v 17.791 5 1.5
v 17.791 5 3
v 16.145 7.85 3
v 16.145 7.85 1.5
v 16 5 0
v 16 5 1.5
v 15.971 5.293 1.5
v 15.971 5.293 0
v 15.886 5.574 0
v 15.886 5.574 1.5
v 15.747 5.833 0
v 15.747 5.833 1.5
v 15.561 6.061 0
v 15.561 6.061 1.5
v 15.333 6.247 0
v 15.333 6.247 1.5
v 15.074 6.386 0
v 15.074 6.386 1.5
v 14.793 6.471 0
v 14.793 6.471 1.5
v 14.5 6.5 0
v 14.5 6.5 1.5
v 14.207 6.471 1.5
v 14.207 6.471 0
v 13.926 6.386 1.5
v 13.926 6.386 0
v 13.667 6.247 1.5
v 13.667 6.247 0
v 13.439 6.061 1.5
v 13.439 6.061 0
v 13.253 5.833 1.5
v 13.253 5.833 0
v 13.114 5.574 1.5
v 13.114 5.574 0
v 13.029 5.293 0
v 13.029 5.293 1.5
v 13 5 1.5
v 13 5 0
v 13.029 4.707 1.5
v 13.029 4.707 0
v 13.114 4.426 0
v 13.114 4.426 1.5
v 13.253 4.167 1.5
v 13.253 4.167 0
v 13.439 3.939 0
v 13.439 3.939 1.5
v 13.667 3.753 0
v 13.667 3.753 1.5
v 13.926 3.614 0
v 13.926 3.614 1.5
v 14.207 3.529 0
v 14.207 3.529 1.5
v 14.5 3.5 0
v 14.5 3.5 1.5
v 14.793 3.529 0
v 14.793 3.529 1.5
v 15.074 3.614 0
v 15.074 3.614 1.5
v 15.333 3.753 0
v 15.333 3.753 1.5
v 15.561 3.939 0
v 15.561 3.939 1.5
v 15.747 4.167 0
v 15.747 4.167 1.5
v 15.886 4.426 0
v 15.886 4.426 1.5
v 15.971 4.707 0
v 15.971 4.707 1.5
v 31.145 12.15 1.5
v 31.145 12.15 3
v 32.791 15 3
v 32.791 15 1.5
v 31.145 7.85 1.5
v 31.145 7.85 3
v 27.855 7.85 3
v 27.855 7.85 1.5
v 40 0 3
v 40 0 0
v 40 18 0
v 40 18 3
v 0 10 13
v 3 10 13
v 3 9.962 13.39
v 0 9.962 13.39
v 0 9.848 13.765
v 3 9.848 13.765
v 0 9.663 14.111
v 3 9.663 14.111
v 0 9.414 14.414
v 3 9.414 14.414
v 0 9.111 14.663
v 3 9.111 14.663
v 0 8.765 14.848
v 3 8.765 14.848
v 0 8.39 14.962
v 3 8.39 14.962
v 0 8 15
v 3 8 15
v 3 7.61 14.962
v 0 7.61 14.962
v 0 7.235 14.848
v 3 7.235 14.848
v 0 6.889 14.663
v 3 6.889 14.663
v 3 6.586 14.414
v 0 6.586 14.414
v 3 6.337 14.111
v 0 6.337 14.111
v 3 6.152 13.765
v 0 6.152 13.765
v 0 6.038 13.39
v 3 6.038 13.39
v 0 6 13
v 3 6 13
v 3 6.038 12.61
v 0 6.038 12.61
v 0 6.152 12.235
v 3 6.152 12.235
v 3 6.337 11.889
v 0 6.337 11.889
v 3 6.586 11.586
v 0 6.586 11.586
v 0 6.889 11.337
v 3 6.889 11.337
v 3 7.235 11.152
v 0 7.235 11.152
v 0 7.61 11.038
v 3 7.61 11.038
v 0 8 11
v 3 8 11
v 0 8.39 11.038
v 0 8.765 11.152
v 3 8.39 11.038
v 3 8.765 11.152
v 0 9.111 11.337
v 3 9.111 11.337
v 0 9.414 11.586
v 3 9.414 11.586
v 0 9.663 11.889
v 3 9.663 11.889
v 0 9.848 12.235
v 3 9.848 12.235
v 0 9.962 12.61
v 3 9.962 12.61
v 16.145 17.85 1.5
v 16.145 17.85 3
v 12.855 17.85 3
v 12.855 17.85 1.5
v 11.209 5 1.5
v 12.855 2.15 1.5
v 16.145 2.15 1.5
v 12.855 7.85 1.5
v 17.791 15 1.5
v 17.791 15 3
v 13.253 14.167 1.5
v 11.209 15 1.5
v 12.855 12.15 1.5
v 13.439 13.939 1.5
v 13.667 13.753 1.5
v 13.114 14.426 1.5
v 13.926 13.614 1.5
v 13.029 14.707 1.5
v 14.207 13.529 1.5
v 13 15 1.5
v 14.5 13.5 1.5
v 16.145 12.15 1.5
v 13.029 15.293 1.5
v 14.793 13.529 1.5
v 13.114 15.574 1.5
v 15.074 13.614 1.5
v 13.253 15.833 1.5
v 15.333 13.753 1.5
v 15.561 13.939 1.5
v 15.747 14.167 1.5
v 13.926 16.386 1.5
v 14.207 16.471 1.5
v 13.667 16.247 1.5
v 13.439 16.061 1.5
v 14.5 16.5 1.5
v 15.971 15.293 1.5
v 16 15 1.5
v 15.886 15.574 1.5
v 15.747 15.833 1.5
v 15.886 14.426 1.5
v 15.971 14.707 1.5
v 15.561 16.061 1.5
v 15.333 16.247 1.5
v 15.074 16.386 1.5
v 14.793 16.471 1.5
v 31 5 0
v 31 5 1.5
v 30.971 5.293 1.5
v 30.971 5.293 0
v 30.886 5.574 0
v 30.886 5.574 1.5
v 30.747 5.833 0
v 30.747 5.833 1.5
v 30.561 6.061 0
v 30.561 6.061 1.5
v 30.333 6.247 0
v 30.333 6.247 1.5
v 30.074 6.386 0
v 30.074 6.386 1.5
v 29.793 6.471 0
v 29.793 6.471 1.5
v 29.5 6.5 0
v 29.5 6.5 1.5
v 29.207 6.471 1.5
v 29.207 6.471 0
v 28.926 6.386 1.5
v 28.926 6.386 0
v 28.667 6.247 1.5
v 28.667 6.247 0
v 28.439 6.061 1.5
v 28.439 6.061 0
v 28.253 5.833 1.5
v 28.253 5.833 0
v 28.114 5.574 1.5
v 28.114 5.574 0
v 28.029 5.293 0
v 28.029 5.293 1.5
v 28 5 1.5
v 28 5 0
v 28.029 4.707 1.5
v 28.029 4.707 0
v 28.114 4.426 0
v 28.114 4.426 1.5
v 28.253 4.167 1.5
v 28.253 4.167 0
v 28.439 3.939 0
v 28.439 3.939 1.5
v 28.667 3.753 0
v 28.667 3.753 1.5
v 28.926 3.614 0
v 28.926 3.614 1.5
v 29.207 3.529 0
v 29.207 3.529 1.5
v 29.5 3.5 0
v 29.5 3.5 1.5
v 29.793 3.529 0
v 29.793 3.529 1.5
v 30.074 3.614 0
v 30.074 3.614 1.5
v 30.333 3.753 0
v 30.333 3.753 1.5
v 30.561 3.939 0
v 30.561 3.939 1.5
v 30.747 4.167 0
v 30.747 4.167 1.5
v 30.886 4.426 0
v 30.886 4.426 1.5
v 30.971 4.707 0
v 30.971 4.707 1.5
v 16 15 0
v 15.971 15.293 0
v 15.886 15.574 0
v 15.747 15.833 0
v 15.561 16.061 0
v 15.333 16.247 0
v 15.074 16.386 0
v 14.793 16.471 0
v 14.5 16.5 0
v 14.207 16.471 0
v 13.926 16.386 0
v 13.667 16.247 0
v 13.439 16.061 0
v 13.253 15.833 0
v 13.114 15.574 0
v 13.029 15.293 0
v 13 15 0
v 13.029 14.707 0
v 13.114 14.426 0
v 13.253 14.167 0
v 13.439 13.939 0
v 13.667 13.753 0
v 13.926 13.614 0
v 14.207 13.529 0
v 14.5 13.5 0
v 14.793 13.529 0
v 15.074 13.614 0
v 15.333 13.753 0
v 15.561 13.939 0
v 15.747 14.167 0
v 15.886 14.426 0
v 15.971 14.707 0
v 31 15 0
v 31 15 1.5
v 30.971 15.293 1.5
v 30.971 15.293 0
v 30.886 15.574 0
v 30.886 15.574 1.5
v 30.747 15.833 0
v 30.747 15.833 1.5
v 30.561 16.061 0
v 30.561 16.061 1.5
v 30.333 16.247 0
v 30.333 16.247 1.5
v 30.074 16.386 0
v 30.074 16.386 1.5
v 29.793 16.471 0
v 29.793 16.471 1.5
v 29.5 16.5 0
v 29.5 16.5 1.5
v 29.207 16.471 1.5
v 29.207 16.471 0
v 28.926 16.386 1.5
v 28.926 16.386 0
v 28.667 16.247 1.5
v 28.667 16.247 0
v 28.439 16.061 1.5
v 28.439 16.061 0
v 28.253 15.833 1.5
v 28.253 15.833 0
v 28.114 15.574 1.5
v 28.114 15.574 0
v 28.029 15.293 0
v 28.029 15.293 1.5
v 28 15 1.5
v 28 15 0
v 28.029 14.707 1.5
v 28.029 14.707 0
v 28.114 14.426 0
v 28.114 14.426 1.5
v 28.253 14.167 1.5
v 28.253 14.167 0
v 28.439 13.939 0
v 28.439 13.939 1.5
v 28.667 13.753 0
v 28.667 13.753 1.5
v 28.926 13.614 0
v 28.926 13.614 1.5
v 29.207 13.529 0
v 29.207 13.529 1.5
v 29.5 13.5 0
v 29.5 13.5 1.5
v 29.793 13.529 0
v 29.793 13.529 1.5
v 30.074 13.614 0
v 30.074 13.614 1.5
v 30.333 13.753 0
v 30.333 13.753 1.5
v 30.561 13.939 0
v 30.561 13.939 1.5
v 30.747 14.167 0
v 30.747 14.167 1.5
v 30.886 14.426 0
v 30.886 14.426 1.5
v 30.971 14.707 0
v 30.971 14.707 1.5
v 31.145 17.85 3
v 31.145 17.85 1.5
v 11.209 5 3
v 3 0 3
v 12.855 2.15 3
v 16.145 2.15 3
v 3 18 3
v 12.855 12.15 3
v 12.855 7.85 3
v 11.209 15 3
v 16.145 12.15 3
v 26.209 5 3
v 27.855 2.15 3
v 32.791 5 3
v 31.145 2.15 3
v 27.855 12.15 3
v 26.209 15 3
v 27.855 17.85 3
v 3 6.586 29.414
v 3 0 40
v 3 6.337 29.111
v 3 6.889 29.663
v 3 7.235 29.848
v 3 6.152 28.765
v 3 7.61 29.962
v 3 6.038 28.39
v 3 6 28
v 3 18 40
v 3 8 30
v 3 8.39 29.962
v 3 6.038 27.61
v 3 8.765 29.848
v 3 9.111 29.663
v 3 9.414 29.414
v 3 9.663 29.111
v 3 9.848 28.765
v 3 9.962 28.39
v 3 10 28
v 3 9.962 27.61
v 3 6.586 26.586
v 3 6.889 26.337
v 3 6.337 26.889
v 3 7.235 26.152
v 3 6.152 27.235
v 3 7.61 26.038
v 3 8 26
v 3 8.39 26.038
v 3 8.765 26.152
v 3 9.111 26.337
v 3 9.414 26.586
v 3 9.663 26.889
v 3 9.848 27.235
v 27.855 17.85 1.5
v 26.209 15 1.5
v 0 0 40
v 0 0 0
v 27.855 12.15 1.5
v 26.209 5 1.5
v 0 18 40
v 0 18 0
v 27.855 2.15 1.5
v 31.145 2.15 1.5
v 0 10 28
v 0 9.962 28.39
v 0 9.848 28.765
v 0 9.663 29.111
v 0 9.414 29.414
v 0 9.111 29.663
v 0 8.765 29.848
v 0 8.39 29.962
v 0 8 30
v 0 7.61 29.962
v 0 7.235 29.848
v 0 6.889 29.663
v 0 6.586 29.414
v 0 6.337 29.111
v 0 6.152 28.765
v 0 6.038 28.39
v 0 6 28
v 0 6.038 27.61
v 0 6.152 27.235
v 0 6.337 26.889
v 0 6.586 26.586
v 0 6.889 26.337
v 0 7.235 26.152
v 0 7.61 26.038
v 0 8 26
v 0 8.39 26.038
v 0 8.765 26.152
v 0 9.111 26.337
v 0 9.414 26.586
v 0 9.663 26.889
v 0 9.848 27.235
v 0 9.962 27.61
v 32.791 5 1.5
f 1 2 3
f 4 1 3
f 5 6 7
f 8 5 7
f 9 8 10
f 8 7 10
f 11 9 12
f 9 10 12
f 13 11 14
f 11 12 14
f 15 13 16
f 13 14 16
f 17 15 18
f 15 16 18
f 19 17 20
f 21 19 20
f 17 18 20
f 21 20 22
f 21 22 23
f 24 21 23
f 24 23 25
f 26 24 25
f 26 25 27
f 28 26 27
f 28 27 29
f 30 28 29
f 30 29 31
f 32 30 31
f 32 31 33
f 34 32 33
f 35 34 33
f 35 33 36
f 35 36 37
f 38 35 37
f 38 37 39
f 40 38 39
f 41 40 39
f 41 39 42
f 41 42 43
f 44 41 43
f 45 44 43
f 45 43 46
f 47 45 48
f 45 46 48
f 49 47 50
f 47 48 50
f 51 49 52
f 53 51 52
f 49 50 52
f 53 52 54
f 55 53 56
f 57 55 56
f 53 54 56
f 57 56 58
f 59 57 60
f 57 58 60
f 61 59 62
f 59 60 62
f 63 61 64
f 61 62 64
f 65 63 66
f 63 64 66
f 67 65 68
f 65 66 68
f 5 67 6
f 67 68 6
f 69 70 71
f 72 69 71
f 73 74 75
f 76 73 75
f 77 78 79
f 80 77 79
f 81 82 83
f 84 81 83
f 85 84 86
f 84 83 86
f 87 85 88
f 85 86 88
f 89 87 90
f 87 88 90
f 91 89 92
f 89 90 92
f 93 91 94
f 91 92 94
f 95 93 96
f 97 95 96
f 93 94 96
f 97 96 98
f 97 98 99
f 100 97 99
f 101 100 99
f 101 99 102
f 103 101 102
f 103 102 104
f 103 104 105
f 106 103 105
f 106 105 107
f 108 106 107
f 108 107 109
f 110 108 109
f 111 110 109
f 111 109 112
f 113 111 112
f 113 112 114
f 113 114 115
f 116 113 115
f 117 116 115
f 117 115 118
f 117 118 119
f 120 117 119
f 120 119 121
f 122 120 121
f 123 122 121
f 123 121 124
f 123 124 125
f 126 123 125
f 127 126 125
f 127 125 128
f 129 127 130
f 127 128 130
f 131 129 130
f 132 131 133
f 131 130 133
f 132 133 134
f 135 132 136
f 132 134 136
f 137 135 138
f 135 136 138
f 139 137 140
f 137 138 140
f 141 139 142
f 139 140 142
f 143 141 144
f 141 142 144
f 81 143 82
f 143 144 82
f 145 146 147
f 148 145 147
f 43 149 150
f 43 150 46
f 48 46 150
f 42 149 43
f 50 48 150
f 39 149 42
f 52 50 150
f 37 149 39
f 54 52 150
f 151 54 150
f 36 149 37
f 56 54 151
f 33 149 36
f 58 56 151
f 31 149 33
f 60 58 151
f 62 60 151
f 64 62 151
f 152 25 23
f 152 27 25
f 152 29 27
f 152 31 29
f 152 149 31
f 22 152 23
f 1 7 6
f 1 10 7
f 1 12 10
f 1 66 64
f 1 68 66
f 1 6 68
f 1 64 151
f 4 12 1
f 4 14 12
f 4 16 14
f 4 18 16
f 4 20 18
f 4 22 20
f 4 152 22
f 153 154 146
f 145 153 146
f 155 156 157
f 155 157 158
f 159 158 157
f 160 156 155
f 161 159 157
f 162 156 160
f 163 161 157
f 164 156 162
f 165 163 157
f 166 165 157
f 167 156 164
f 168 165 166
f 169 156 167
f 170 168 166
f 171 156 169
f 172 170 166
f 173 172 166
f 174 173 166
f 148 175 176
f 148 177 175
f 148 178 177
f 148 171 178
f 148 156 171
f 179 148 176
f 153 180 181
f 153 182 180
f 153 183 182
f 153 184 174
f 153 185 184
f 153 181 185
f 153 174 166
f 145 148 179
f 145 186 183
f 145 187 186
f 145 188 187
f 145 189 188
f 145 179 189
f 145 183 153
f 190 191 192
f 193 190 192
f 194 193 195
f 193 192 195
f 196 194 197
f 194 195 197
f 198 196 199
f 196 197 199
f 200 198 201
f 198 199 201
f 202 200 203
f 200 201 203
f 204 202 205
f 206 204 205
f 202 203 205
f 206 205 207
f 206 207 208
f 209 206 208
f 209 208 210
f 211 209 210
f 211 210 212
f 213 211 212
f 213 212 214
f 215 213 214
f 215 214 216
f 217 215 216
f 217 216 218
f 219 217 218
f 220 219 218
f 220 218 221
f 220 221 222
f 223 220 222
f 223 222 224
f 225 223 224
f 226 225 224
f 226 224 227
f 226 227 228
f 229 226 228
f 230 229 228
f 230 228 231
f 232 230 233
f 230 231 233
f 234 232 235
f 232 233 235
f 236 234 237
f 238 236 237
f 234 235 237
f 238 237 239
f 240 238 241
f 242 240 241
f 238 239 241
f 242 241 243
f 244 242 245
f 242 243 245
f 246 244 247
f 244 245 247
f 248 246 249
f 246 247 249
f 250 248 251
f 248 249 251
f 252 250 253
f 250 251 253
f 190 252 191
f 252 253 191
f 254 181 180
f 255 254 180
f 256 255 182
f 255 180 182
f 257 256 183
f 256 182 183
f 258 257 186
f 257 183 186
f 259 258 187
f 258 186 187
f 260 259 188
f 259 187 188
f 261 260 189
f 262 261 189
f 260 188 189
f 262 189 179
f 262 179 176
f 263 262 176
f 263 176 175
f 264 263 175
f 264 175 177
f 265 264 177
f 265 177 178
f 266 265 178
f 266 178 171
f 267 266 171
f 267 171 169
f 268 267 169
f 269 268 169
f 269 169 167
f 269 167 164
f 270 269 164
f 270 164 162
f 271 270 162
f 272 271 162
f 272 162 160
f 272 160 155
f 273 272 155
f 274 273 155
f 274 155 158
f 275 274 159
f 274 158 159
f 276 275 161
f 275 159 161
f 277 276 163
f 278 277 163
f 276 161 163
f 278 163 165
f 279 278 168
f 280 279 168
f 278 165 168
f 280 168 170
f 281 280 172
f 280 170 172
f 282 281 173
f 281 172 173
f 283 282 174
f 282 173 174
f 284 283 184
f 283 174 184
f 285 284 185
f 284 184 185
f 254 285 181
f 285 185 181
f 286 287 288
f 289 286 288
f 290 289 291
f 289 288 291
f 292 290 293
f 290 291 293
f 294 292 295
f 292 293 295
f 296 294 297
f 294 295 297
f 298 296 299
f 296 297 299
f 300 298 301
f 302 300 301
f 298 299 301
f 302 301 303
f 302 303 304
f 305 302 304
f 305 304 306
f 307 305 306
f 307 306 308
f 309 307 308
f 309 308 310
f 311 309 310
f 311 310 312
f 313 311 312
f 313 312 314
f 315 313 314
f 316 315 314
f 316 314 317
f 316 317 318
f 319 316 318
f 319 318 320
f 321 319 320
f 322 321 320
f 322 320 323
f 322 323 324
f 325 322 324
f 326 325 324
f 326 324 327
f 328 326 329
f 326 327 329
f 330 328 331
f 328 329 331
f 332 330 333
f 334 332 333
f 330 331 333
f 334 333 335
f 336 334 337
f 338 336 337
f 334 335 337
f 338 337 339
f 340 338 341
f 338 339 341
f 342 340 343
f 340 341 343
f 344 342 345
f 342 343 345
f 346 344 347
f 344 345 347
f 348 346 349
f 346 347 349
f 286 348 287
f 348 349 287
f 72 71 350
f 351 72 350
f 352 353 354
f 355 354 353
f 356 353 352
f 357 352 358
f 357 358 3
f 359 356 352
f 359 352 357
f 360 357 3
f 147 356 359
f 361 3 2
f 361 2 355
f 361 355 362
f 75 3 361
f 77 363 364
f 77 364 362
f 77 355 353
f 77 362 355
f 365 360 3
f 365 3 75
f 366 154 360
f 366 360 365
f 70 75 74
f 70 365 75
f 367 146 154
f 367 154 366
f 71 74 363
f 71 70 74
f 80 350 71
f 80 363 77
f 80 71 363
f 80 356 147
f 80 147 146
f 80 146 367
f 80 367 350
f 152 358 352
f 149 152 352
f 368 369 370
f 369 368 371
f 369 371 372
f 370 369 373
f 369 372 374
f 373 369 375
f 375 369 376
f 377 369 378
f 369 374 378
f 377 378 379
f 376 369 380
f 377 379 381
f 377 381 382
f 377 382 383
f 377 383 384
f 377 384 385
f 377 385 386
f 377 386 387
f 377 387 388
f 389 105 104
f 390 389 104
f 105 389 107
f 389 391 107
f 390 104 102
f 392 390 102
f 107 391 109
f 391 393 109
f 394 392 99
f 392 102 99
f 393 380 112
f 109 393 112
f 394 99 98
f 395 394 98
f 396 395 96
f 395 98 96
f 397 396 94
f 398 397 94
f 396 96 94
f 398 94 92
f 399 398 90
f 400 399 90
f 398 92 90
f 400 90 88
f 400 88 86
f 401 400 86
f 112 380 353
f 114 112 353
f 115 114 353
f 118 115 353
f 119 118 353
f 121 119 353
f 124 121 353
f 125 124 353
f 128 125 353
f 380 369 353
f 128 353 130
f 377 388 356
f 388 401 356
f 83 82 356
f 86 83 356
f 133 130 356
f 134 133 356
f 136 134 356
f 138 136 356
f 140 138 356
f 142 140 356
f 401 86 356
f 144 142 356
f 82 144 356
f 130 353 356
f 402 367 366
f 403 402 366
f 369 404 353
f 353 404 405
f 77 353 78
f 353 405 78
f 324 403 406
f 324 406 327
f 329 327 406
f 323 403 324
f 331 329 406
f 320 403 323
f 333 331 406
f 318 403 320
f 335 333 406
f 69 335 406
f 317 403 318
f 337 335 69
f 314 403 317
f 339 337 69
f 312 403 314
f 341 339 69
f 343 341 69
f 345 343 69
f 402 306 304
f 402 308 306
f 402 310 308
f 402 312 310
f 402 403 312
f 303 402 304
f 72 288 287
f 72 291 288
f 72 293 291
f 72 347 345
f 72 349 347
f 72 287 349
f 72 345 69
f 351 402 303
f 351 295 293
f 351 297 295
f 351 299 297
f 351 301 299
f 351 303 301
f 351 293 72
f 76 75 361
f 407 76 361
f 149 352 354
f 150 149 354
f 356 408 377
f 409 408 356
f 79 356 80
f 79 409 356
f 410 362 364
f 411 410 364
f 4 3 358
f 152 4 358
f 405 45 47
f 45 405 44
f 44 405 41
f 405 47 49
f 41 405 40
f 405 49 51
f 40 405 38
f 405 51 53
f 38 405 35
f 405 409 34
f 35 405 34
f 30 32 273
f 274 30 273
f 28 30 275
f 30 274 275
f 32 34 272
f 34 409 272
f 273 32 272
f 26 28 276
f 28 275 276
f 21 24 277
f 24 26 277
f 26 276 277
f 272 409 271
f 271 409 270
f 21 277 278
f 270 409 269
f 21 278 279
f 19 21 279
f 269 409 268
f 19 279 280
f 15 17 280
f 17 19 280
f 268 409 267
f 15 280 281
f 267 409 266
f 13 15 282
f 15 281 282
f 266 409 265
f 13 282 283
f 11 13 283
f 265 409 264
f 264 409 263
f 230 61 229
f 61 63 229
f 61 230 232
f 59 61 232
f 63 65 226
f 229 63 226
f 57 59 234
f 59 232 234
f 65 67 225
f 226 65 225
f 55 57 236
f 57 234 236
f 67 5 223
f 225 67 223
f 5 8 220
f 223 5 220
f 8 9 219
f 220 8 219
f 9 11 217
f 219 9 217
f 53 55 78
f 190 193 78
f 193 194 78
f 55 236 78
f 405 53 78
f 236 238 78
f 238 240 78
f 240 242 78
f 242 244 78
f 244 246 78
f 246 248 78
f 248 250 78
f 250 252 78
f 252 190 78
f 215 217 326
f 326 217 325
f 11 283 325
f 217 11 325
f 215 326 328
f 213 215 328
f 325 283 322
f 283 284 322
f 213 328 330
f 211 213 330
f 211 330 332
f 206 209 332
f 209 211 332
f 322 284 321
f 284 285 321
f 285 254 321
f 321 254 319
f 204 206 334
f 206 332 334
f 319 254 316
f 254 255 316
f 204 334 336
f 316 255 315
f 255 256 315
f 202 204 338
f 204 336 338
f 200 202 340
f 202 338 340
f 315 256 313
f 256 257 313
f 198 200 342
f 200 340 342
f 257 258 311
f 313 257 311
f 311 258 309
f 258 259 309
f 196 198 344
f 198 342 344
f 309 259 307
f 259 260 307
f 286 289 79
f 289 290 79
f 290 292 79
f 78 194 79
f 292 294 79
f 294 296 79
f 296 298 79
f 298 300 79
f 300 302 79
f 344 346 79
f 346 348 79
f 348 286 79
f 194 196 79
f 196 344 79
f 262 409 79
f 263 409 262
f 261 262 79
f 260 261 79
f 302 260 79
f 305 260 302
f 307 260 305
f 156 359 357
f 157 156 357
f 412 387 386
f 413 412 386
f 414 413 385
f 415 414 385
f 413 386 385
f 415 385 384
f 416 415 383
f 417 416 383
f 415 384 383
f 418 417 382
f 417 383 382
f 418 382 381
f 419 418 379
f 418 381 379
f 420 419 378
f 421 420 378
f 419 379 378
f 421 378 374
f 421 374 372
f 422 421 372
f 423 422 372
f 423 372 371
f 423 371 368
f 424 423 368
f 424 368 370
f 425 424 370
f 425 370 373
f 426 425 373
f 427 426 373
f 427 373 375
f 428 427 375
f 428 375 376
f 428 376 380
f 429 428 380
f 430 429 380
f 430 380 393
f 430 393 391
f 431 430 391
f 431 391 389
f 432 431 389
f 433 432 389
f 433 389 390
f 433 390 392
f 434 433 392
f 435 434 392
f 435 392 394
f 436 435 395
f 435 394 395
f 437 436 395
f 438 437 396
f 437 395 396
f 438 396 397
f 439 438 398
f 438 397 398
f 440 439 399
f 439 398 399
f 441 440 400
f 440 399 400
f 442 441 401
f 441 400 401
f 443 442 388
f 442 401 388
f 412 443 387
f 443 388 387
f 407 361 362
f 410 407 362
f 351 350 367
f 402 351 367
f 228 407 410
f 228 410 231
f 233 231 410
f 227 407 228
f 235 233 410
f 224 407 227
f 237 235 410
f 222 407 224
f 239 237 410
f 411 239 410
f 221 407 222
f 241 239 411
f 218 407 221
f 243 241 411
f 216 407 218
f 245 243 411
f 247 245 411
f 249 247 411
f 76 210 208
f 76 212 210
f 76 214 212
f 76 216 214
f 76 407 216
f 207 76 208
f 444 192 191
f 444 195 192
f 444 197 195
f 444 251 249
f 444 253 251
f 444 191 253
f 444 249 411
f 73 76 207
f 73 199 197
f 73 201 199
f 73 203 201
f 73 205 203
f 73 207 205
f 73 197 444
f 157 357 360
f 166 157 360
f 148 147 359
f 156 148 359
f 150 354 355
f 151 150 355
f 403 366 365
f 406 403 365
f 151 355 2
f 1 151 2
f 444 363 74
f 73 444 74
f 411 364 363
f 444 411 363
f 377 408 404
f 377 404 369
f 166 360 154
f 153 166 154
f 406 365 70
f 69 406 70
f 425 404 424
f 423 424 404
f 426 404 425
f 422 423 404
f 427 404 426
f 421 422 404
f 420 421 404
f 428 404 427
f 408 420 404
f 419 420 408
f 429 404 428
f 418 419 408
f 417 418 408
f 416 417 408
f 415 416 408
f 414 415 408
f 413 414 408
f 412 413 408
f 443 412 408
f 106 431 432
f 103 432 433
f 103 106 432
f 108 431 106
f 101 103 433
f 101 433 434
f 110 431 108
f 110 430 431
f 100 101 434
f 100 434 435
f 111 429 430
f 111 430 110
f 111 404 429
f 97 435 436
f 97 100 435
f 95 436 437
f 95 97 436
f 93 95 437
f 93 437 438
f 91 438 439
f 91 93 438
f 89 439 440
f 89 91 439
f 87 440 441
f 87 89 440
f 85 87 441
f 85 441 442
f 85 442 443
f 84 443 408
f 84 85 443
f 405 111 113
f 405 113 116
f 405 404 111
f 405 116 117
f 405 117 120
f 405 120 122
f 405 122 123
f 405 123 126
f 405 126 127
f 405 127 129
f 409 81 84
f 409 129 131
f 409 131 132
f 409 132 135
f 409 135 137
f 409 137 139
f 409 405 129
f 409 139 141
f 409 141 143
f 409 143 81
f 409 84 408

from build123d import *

# Parameters (mm, degrees)
ESQUISSE1_W             = 40
ESQUISSE1_H             = 18
BOSS_EXTRU_1_DEPTH      = 3
ESQUISSE2_W             = 3
ESQUISSE2_H             = 18
BOSS_EXTRU_2_DEPTH      = 37
ESQUISSE3_R             = 1.5
ENL_V_MAT_EXTRU_1_DEPTH = 58.384666942
ESQUISSE4_R             = 2
ENL_V_MAT_EXTRU_2_DEPTH = 58.384666942
ENL_V_MAT_EXTRU_3_DEPTH = 1.5


with BuildPart() as part:
    # Esquisse1 → Boss.-Extru.1 (new body)
    with BuildSketch(Plane.XY):
        with Locations((20, 9)):
            Rectangle(ESQUISSE1_W, ESQUISSE1_H)
    extrude(amount=BOSS_EXTRU_1_DEPTH)

    # Esquisse2 → Boss.-Extru.2 (add)
    with BuildSketch(Plane.XY.offset(3)):
        with Locations((1.5, 9)):
            Rectangle(ESQUISSE2_W, ESQUISSE2_H)
    extrude(amount=BOSS_EXTRU_2_DEPTH)

    # Esquisse3 → Enlèv. mat.-Extru.1 (cut, through all)
    with BuildSketch(Plane.XY.offset(3)):
        with Locations((14.5, 15)):
            Circle(ESQUISSE3_R)
        with Locations((29.5, 15)):
            Circle(ESQUISSE3_R)
        with Locations((14.5, 5)):
            Circle(ESQUISSE3_R)
        with Locations((29.5, 5)):
            Circle(ESQUISSE3_R)
    extrude(amount=-ENL_V_MAT_EXTRU_1_DEPTH, mode=Mode.SUBTRACT)

    # Esquisse4 → Enlèv. mat.-Extru.2 (cut, through all)
    with BuildSketch(Plane(origin=(3, 0, 0), x_dir=(0, 0, -1), z_dir=(1, 0, 0))):
        with Locations(Location((-28, 8, 0), (0, 0, 90))):
            Circle(ESQUISSE4_R)
        with Locations(Location((-13, 8, 0), (0, 0, 90))):
            Circle(ESQUISSE4_R)
    extrude(amount=-ENL_V_MAT_EXTRU_2_DEPTH, mode=Mode.SUBTRACT)

    # Esquisse5 → Enlèv. mat.-Extru.3 (cut)
    with BuildSketch(Plane.XY.offset(3)):
        Polygon((12.854551733, 7.85), (11.209103466, 5), (12.854551733, 2.15), (16.145448267, 2.15), (17.790896534, 5), (16.145448267, 7.85), align=None)
        Polygon((27.854551733, 17.85), (26.209103466, 15), (27.854551733, 12.15), (31.145448267, 12.15), (32.790896534, 15), (31.145448267, 17.85), align=None)
        Polygon((27.854551733, 7.85), (26.209103466, 5), (27.854551733, 2.15), (31.145448267, 2.15), (32.790896534, 5), (31.145448267, 7.85), align=None)
        Polygon((12.854551733, 17.85), (11.209103466, 15), (12.854551733, 12.15), (16.145448267, 12.15), (17.790896534, 15), (16.145448267, 17.85), align=None)
    extrude(amount=-ENL_V_MAT_EXTRU_3_DEPTH, mode=Mode.SUBTRACT)


solid = part.part
